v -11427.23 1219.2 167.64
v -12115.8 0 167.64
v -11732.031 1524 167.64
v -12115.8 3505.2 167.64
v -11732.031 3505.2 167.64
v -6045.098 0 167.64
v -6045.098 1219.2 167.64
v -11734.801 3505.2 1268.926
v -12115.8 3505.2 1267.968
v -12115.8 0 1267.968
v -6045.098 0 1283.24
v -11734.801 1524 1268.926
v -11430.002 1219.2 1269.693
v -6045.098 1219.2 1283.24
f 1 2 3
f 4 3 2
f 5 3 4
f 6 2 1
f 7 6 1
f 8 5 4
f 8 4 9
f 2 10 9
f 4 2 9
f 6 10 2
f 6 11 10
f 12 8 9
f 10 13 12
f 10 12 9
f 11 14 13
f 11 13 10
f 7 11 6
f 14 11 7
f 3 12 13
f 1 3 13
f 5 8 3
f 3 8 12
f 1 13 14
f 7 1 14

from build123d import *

# Parameters (mm, degrees)
F2_W     = 3505.2
F2_H     = 1100.328
F0_W     = 3505.2
F0_H     = 1130.808
F5_DEPTH = 1129.8540878931
F7_W     = 3505.2
F7_H     = 1371.6
F8_DEPTH = 6045.0994001


with BuildPart() as f3:
    # F2 (on offset) → F3 section 0
    with BuildSketch(Plane.YZ.offset(-12115.8)):
        with Locations((1752.6, 717.804)):
            Rectangle(F2_W, F2_H)
    # F0 (on Right) → F3 section 1
    with BuildSketch(Plane.YZ):
        with Locations((1752.6, 733.044)):
            Rectangle(F0_W, F0_H)
    loft()

    # F4 (on face) → F5 (cut, through all)
    with BuildSketch(Plane(origin=(-3.2665151757, 0, 1298.4397823518), x_dir=(0.9999968356, 0, 0.0025157153), z_dir=(-0.0025157153, 0, 0.9999968356))):
        Polygon((-377.7334744876, 3505.2), (-11731.5718140496, 3505.2), (-11731.5718140496, 1524), (-11426.7718140496, 1219.2), (-682.5334744876, 1219.2), (-377.7334744876, 1524), align=None)
    extrude(amount=-F5_DEPTH, mode=Mode.SUBTRACT)

    # F7 (on offset) → F8 (cut, through all)
    with BuildSketch(Plane.YZ.offset(-6045.0984)):
        with Locations((1752.6, 685.8)):
            Rectangle(F7_W, F7_H)
    extrude(amount=F8_DEPTH, mode=Mode.SUBTRACT)


solid = f3.part
